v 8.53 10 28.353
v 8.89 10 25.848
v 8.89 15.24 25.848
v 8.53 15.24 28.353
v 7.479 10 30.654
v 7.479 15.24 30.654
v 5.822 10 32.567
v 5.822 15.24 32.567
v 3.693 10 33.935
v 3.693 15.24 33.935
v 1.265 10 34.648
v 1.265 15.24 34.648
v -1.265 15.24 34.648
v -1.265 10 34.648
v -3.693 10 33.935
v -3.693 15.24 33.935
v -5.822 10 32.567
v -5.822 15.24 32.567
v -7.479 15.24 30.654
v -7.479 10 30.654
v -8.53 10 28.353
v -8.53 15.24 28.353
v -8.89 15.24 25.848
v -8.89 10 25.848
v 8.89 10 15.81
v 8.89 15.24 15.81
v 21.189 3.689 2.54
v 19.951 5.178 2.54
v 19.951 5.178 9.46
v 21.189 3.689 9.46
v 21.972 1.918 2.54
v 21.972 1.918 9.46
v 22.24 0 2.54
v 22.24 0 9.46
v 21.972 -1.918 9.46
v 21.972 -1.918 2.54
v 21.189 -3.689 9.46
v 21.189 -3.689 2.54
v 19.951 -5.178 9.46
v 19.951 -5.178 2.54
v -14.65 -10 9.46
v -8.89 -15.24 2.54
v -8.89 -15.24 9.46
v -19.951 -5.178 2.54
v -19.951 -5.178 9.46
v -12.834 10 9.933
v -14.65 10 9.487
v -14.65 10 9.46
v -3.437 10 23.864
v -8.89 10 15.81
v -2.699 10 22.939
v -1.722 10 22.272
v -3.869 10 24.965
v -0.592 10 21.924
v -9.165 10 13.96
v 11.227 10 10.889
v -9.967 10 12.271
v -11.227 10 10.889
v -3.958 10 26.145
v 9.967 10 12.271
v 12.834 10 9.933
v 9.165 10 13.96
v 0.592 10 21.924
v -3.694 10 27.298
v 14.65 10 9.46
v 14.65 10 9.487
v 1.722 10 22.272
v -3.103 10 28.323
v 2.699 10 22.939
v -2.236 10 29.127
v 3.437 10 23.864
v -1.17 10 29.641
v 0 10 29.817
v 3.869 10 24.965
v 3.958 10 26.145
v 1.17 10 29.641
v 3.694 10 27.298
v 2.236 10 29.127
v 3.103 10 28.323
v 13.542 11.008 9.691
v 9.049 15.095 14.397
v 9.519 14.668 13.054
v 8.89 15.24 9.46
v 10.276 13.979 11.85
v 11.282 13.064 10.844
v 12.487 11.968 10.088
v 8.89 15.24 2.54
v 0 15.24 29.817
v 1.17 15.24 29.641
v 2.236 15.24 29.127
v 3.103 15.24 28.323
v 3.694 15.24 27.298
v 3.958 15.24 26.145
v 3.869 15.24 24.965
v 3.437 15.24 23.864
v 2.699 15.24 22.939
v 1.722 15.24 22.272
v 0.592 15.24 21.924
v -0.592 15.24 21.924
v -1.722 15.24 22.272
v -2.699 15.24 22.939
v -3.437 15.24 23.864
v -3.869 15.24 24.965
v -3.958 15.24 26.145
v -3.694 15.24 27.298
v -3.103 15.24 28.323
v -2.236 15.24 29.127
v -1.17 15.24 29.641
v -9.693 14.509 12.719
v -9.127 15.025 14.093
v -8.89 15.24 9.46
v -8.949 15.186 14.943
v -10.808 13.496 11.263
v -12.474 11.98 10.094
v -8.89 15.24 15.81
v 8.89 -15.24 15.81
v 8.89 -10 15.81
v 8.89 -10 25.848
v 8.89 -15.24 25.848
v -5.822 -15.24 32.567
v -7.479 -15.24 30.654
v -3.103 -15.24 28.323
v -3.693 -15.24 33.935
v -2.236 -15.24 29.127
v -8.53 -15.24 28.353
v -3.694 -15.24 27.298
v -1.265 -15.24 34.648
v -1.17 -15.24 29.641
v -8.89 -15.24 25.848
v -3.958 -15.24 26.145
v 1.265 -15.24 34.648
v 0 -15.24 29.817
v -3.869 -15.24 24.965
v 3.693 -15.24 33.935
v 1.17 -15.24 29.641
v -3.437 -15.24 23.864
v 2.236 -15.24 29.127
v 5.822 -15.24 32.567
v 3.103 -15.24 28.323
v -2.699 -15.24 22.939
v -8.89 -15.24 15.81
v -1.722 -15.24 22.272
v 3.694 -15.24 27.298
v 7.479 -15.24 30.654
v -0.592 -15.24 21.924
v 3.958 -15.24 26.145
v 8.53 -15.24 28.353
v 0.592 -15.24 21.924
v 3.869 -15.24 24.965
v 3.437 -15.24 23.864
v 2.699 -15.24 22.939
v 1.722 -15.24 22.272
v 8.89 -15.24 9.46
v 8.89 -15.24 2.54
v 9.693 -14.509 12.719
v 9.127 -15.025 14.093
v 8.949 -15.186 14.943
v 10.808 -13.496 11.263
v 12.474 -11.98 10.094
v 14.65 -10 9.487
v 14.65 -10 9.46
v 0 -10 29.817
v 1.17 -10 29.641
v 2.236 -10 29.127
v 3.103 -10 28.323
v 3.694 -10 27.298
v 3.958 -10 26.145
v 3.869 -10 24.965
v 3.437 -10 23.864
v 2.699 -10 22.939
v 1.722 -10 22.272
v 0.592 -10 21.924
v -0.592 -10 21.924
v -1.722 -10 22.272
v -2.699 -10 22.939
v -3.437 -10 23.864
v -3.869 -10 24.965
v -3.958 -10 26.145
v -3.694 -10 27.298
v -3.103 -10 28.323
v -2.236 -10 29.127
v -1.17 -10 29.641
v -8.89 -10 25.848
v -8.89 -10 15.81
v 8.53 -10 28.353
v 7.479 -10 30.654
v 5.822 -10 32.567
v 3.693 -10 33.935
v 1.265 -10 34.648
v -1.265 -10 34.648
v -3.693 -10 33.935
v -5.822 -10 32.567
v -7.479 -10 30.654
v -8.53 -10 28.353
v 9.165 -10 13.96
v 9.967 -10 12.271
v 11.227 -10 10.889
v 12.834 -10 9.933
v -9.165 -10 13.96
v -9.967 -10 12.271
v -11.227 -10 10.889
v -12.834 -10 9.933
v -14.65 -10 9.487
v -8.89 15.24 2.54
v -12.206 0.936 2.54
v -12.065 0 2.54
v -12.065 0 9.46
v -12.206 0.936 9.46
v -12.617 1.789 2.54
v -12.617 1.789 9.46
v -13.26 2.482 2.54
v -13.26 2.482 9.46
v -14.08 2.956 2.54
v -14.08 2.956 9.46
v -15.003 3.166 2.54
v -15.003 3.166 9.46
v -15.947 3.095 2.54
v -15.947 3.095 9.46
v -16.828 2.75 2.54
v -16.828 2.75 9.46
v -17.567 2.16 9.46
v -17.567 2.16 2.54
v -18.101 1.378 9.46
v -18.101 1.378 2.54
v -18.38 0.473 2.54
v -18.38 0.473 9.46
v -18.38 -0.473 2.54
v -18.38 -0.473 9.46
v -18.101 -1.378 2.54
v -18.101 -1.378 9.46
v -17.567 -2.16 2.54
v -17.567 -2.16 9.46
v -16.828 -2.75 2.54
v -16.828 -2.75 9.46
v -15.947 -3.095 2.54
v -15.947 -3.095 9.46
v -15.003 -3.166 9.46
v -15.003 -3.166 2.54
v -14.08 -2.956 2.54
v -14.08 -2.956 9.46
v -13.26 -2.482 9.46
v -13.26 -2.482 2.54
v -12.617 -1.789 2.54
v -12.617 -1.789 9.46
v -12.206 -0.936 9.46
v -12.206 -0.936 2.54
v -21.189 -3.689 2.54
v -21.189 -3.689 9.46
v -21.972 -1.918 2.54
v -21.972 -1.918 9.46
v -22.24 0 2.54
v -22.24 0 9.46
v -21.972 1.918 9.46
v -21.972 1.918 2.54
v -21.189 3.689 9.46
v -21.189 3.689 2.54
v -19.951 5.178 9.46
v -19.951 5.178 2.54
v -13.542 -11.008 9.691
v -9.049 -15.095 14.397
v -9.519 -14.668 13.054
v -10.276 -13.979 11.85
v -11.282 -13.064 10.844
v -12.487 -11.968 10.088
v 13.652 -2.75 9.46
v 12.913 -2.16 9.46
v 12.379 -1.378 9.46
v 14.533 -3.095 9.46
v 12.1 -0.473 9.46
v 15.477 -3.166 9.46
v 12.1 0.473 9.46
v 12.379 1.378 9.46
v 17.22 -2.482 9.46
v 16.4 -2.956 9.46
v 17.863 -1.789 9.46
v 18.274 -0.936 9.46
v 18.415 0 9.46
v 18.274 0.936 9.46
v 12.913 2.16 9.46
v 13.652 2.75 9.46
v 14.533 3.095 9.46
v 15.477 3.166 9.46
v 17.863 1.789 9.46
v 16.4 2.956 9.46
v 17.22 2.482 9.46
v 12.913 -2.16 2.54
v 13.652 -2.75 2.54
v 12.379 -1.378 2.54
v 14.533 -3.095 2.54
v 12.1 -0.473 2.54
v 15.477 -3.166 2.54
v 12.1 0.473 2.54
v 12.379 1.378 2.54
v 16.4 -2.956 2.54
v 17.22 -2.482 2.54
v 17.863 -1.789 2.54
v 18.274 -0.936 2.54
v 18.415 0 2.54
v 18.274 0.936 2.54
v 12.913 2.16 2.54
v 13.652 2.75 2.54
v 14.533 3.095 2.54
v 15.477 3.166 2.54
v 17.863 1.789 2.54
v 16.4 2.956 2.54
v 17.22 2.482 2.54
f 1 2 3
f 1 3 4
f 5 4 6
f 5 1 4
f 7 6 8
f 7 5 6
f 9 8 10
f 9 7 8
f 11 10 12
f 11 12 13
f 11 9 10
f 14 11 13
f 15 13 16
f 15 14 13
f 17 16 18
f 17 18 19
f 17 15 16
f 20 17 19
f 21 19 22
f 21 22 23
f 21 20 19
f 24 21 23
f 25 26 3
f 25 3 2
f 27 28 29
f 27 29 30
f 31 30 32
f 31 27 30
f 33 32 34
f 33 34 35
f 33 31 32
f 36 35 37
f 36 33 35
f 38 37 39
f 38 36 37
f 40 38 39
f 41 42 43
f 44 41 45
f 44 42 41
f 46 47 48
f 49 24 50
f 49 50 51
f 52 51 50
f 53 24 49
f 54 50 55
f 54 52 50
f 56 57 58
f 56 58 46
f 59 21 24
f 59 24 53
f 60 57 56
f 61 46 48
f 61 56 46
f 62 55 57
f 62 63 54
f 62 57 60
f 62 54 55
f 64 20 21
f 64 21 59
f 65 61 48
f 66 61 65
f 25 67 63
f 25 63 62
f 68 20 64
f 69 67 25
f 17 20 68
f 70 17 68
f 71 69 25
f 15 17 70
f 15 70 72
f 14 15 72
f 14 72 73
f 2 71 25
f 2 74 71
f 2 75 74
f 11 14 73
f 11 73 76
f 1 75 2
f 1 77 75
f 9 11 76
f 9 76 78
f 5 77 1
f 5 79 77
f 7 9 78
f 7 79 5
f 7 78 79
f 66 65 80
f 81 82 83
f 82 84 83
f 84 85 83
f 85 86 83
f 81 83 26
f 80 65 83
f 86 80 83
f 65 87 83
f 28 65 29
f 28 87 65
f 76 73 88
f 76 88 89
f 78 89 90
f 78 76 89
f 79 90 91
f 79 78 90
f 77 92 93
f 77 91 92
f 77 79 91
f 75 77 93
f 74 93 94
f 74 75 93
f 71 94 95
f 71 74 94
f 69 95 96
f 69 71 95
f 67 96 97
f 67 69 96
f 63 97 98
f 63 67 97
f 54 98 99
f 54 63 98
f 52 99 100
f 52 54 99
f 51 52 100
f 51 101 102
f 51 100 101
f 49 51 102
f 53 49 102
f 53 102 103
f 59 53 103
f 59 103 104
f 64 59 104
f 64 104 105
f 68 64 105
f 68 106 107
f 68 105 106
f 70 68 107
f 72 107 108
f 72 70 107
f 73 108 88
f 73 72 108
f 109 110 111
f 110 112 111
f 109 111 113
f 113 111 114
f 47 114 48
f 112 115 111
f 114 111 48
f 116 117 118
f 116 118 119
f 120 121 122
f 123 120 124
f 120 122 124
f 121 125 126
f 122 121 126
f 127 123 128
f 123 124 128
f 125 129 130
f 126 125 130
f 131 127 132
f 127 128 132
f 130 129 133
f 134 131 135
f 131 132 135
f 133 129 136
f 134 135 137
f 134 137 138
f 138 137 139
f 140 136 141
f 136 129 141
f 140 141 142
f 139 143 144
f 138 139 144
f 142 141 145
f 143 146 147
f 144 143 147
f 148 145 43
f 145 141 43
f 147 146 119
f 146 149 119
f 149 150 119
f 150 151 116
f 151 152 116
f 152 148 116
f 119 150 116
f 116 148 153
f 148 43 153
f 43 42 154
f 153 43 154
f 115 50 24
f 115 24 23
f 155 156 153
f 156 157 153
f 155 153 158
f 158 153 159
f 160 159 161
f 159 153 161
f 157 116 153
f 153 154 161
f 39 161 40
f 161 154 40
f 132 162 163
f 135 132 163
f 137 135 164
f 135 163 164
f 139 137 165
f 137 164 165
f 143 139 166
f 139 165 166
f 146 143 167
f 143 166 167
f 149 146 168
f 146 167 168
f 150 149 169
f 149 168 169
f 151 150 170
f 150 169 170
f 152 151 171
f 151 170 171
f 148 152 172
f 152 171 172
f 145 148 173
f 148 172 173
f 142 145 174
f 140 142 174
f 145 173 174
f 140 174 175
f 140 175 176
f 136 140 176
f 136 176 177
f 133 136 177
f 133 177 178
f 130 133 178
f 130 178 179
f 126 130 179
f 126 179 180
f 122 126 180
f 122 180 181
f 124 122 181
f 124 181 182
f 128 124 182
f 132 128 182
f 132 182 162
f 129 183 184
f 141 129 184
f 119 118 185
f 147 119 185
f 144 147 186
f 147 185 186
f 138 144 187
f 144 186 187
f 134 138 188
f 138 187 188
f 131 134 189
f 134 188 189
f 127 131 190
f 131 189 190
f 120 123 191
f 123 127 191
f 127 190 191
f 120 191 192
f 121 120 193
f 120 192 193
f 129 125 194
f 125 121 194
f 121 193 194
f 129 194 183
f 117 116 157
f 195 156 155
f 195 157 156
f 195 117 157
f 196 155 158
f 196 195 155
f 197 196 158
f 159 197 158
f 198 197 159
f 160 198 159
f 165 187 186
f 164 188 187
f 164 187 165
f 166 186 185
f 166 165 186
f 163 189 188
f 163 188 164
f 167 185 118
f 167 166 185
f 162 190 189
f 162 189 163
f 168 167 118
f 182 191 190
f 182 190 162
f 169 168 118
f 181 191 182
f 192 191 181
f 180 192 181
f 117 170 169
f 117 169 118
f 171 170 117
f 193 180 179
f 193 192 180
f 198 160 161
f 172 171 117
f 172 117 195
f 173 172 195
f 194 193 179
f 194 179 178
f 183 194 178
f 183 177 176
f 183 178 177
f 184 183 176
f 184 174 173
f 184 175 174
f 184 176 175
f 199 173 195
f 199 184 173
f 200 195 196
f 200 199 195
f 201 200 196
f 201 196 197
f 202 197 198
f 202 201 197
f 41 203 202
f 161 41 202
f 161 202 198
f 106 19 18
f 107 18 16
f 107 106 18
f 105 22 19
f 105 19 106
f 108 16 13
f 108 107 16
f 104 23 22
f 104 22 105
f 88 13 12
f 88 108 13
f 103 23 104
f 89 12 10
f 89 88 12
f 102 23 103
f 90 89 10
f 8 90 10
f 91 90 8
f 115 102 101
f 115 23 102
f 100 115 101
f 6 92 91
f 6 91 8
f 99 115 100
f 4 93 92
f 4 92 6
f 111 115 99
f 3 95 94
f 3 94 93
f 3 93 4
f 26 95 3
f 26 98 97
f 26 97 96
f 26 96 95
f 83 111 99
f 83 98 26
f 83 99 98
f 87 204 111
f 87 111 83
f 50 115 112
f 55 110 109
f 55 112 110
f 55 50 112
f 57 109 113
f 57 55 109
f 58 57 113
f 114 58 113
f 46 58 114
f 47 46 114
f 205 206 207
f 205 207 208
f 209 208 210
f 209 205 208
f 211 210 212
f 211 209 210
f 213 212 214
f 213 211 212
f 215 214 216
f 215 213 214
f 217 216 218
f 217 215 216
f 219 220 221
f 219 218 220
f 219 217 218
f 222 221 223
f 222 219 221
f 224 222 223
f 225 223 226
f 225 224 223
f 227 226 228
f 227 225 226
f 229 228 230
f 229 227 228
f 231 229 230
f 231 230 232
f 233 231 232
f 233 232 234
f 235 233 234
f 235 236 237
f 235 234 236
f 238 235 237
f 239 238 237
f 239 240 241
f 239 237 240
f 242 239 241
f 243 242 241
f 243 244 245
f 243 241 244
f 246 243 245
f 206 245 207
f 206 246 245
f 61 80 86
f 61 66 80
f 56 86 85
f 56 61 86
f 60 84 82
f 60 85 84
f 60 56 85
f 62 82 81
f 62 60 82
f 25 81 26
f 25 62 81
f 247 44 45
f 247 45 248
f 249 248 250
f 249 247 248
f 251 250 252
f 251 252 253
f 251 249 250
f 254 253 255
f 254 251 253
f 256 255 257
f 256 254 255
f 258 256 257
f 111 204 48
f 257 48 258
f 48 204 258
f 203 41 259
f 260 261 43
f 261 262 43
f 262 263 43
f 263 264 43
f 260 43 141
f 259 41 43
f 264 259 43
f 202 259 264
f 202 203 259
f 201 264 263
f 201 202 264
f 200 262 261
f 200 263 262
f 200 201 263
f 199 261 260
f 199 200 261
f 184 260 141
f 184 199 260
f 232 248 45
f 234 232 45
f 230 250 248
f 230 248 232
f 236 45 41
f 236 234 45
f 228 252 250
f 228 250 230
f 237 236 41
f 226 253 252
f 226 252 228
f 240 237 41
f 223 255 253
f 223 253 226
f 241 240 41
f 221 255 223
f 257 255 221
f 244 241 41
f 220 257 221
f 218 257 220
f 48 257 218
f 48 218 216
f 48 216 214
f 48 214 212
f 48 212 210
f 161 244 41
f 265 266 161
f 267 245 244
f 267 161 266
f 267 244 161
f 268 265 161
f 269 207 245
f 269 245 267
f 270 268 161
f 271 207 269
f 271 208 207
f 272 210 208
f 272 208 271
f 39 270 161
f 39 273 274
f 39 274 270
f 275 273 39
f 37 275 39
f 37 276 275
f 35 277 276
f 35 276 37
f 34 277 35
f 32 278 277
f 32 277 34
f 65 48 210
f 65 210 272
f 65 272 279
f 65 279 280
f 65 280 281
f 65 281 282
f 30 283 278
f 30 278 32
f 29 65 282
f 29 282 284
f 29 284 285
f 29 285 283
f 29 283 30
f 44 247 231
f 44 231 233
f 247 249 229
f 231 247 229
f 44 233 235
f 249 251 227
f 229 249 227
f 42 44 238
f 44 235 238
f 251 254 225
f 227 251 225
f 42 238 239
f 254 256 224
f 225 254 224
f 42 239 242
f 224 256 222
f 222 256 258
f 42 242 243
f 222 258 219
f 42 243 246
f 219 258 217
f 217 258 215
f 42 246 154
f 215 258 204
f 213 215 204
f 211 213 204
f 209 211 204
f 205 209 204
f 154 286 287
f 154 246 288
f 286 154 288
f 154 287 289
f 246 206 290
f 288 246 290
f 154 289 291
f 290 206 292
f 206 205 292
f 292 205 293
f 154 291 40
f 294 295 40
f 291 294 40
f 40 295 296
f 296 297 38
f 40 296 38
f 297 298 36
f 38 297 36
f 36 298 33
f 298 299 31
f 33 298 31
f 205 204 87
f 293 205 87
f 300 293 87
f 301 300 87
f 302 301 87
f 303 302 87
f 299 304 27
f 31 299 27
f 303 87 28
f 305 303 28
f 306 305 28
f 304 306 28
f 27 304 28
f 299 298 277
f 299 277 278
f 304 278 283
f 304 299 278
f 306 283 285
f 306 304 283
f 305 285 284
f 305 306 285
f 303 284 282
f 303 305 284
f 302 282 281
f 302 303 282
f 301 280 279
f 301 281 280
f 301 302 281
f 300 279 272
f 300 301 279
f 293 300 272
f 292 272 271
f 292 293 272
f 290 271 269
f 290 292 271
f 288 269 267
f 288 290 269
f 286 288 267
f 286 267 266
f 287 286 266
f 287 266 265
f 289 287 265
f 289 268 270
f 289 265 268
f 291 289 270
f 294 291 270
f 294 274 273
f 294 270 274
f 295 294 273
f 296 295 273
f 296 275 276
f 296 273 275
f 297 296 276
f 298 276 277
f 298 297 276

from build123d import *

# Parameters (mm, degrees)
SKETCH1_W                      = 46.48
SKETCH1_H                      = 30.48
SKETCH1_R                      = 3.175
BOSS_EXTRUDE1_DEPTH            = 9.46
SKETCH2_W                      = 46.48
SKETCH2_H                      = 5.24
BOSS_EXTRUDE2_DEPTH            = 53
CUT_EXTRUDE1_REACH             = 70.364
SKETCH4_R                      = 3.96875
CUT_EXTRUDE1_DIRECTION_2_REACH = 70.364
CUT_EXTRUDE3_REACH             = 70.364
CUT_EXTRUDE3_DIRECTION_2_REACH = 70.364
CUT_EXTRUDE4_DEPTH             = 9.46
BOSS_EXTRUDE3_DEPTH            = 9.46
FILLET3_R                      = 6.35
CUT_EXTRUDE5_DEPTH             = 2.54


with BuildPart() as part:
    # Sketch1 → Boss-Extrude1 (new body)
    with BuildSketch(Plane.XY):
        Rectangle(SKETCH1_W, SKETCH1_H)
        with Locations((15.24, 0)):
            Circle(SKETCH1_R, mode=Mode.SUBTRACT)
        with Locations((-15.24, 0)):
            Circle(SKETCH1_R, mode=Mode.SUBTRACT)
    extrude(amount=BOSS_EXTRUDE1_DEPTH)

    # Sketch2 → Boss-Extrude2 (add)
    with BuildSketch(Plane.XY.offset(9.46)):
        with Locations((0, 12.62)):
            Rectangle(SKETCH2_W, SKETCH2_H)
        with Locations((0, -12.62)):
            Rectangle(SKETCH2_W, SKETCH2_H)
    extrude(amount=BOSS_EXTRUDE2_DEPTH)

    # Cut-Extrude1: up to this face of the body (flat: up to its plane)
    cut_extrude1_end = Plane(part.part.faces().sort_by_distance((0, -15.24, 31.23))[0])
    # Sketch4 → Cut-Extrude1 (cut, up to the picked face)
    with BuildSketch(Plane(origin=(0, 0, 0), x_dir=(1, 0, 0), z_dir=(0, 1, 0)), mode=Mode.PRIVATE) as cut_extrude1_sk1:
        with Locations(Location((0, -25.8481308, 0), (0, 0, 270))):
            Circle(SKETCH4_R)
    cut_extrude1_tool1 = split(extrude(cut_extrude1_sk1.sketch, amount=-CUT_EXTRUDE1_REACH, mode=Mode.PRIVATE), bisect_by=cut_extrude1_end, keep=Keep.BOTH, mode=Mode.PRIVATE)
    add(cut_extrude1_tool1.solids().sort_by(Axis((0, 0, 25.848131), (0, -1, 0)))[0], mode=Mode.SUBTRACT)

    # Cut-Extrude1 direction 2: up to this face of the body (flat: up to its plane)
    cut_extrude1_direction_2_end = Plane(part.part.faces().sort_by_distance((0, 15.24, 31.23))[0])
    # Sketch4 → Cut-Extrude1 direction 2 (cut, up to the picked face)
    with BuildSketch(Plane(origin=(0, 0, 0), x_dir=(1, 0, 0), z_dir=(0, 1, 0)), mode=Mode.PRIVATE) as cut_extrude1_direction_2_sk1:
        with Locations(Location((0, -25.8481308, 0), (0, 0, 270))):
            Circle(SKETCH4_R)
    cut_extrude1_direction_2_tool1 = split(extrude(cut_extrude1_direction_2_sk1.sketch, amount=CUT_EXTRUDE1_DIRECTION_2_REACH, mode=Mode.PRIVATE), bisect_by=cut_extrude1_direction_2_end, keep=Keep.BOTH, mode=Mode.PRIVATE)
    add(cut_extrude1_direction_2_tool1.solids().sort_by(Axis((0, 0, 25.848131), (0, 1, 0)))[0], mode=Mode.SUBTRACT)

    # Cut-Extrude3: up to this face of the body (flat: up to its plane)
    cut_extrude3_end = Plane(part.part.faces().sort_by_distance((0, -15.24, 31.323322986))[0])
    # Sketch6 → Cut-Extrude3 (cut, up to the picked face)
    with BuildSketch(Plane(origin=(0, 0, 0), x_dir=(1, 0, 0), z_dir=(0, 1, 0)), mode=Mode.PRIVATE) as cut_extrude3_sk1:
        with BuildLine():
            Line((-8.89, -25.8481308), (-8.89, -17.46))
            Line((-8.89, -17.46), (-8.89, -9.46))
            Line((-8.89, -9.46), (-16.89, -9.46))
            Line((-16.89, -9.46), (-23.24, -9.46))
            Line((-23.24, -9.46), (-23.24, -62.46))
            Line((-23.24, -62.46), (23.24, -62.46))
            Line((23.24, -62.46), (23.24, -9.46))
            Line((23.24, -9.46), (16.89, -9.46))
            Line((16.89, -9.46), (8.89, -9.46))
            Line((8.89, -9.46), (8.89, -17.46))
            Line((8.89, -17.46), (8.89, -25.8481308))
            ThreePointArc((8.89, -25.8481308), (0, -34.7381308), (-8.89, -25.8481308))
        make_face()
    cut_extrude3_tool1 = split(extrude(cut_extrude3_sk1.sketch, amount=-CUT_EXTRUDE3_REACH, mode=Mode.PRIVATE), bisect_by=cut_extrude3_end, keep=Keep.BOTH, mode=Mode.PRIVATE)
    add(cut_extrude3_tool1.solids().sort_by(Axis((0, 0, 38.948856), (0, -1, 0)))[0], mode=Mode.SUBTRACT)

    # Cut-Extrude3 direction 2: up to this face of the body (flat: up to its plane)
    cut_extrude3_direction_2_end = Plane(part.part.faces().sort_by_distance((0, 15.24, 31.323322986))[0])
    # Sketch6 → Cut-Extrude3 direction 2 (cut, up to the picked face)
    with BuildSketch(Plane(origin=(0, 0, 0), x_dir=(1, 0, 0), z_dir=(0, 1, 0)), mode=Mode.PRIVATE) as cut_extrude3_direction_2_sk1:
        with BuildLine():
            Line((-8.89, -25.8481308), (-8.89, -17.46))
            Line((-8.89, -17.46), (-8.89, -9.46))
            Line((-8.89, -9.46), (-16.89, -9.46))
            Line((-16.89, -9.46), (-23.24, -9.46))
            Line((-23.24, -9.46), (-23.24, -62.46))
            Line((-23.24, -62.46), (23.24, -62.46))
            Line((23.24, -62.46), (23.24, -9.46))
            Line((23.24, -9.46), (16.89, -9.46))
            Line((16.89, -9.46), (8.89, -9.46))
            Line((8.89, -9.46), (8.89, -17.46))
            Line((8.89, -17.46), (8.89, -25.8481308))
            ThreePointArc((8.89, -25.8481308), (0, -34.7381308), (-8.89, -25.8481308))
        make_face()
    cut_extrude3_direction_2_tool1 = split(extrude(cut_extrude3_direction_2_sk1.sketch, amount=CUT_EXTRUDE3_DIRECTION_2_REACH, mode=Mode.PRIVATE), bisect_by=cut_extrude3_direction_2_end, keep=Keep.BOTH, mode=Mode.PRIVATE)
    add(cut_extrude3_direction_2_tool1.solids().sort_by(Axis((0, 0, 38.948856), (0, 1, 0)))[0], mode=Mode.SUBTRACT)

    # Sketch7 → Cut-Extrude4 (cut)
    with BuildSketch(Plane.XY):
        with BuildLine():
            ThreePointArc((-15.24, -7), (-22.24, 0), (-15.24, 7))
            Line((-15.24, 7), (-8.89, 7))
            Line((-8.89, 7), (-8.89, 15.24))
            Line((-8.89, 15.24), (-23.24, 15.24))
            Line((-23.24, 15.24), (-23.24, -15.24))
            Line((-23.24, -15.24), (-8.89, -15.24))
            Line((-8.89, -15.24), (-8.89, -7))
            Line((-8.89, -7), (-15.24, -7))
        make_face()
        with BuildLine():
            Line((8.89, 15.24), (8.89, 7))
            Line((8.89, 7), (15.24, 7))
            ThreePointArc((15.24, 7), (22.24, 0), (15.24, -7))
            Line((15.24, -7), (8.89, -7))
            Line((8.89, -7), (8.89, -15.24))
            Line((8.89, -15.24), (23.24, -15.24))
            Line((23.24, -15.24), (23.24, 15.24))
            Line((23.24, 15.24), (8.89, 15.24))
        make_face()
    extrude(amount=CUT_EXTRUDE4_DEPTH, mode=Mode.SUBTRACT)

    # Sketch8 → Boss-Extrude3 (add)
    with BuildSketch(Plane.XY):
        with BuildLine():
            Line((8.89, -15.24), (19.950515714, -5.177937978))
            ThreePointArc((19.950515714, -5.177937978), (17.765315243, -6.528612634), (15.24, -7))
            Line((15.24, -7), (8.89, -7))
            Line((8.89, -7), (8.89, -15.24))
        make_face()
        with BuildLine():
            ThreePointArc((-19.950515714, -5.177937978), (-17.765315243, -6.528612634), (-15.24, -7))
            Line((-15.24, -7), (-8.89, -7))
            Line((-8.89, -7), (-8.89, -15.24))
            Line((-8.89, -15.24), (-19.950515714, -5.177937978))
        make_face()
        with BuildLine():
            Line((8.89, 15.24), (19.950515714, 5.177937978))
            ThreePointArc((19.950515714, 5.177937978), (17.765315243, 6.528612634), (15.24, 7))
            Line((15.24, 7), (8.89, 7))
            Line((8.89, 7), (8.89, 15.24))
        make_face()
        with BuildLine():
            Line((-8.89, 15.24), (-19.950515714, 5.177937978))
            ThreePointArc((-19.950515714, 5.177937978), (-17.765315243, 6.528612634), (-15.24, 7))
            Line((-15.24, 7), (-8.89, 7))
            Line((-8.89, 7), (-8.89, 15.24))
        make_face()
    extrude(amount=BOSS_EXTRUDE3_DEPTH)

    # Fillet3
    # the kernel refuses this fillet: 6.35 mm, written as the material it adds along each edge
    with BuildSketch(Plane(origin=(8.89, -10, 9.46), x_dir=(0, 0, 1), z_dir=(0, -1, 0))) as fillet3_piece_1_section:
        with BuildLine():
            CenterArc((FILLET3_R, -FILLET3_R), FILLET3_R, 90, 90)
            Line((0, -FILLET3_R), (0, 0))
            Line((0, 0), (FILLET3_R, 0))
        make_face()
    fillet3_piece_1 = extrude(amount=5.24, mode=Mode.PRIVATE)
    fillet3_piece_1 = split(fillet3_piece_1, bisect_by=Plane(origin=(10.975439596, -13.342816984, 11.151175663), z_dir=(-0.6729308163346117, 0.7397054254412585, 0)), keep=Keep.TOP, mode=Mode.PRIVATE)
    add(fillet3_piece_1)
    with BuildSketch(Plane(origin=(-8.89, -10, 9.46), x_dir=(0, 0, 1), z_dir=(0, -1, 0))) as fillet3_piece_2_section:
        with BuildLine():
            CenterArc((FILLET3_R, FILLET3_R), FILLET3_R, 180, 90)
            Line((0, FILLET3_R), (0, 0))
            Line((0, 0), (FILLET3_R, 0))
        make_face()
    fillet3_piece_2 = extrude(amount=5.24, mode=Mode.PRIVATE)
    fillet3_piece_2 = split(fillet3_piece_2, bisect_by=Plane(origin=(-10.975439596, -13.342816984, 11.151175663), z_dir=(0.6729308163346114, 0.7397054254412588, 0)), keep=Keep.TOP, mode=Mode.PRIVATE)
    add(fillet3_piece_2)
    with BuildSketch(Plane(origin=(8.89, 10, 9.46), x_dir=(1, 0, 0), z_dir=(0, 1, 0))) as fillet3_piece_3_section:
        with BuildLine():
            CenterArc((FILLET3_R, -FILLET3_R), FILLET3_R, 90, 90)
            Line((0, -FILLET3_R), (0, 0))
            Line((0, 0), (FILLET3_R, 0))
        make_face()
    fillet3_piece_3 = extrude(amount=5.24, mode=Mode.PRIVATE)
    fillet3_piece_3 = split(fillet3_piece_3, bisect_by=Plane(origin=(10.975439596, 13.342816985, 11.151175663), z_dir=(-0.6729308163346115, -0.7397054254412587, 0)), keep=Keep.TOP, mode=Mode.PRIVATE)
    add(fillet3_piece_3)
    with BuildSketch(Plane(origin=(-8.89, 10, 9.46), x_dir=(-1, 0, 0), z_dir=(0, 1, 0))) as fillet3_piece_4_section:
        with BuildLine():
            CenterArc((FILLET3_R, FILLET3_R), FILLET3_R, 180, 90)
            Line((0, FILLET3_R), (0, 0))
            Line((0, 0), (FILLET3_R, 0))
        make_face()
    fillet3_piece_4 = extrude(amount=5.24, mode=Mode.PRIVATE)
    fillet3_piece_4 = split(fillet3_piece_4, bisect_by=Plane(origin=(-10.975439596, 13.342816985, 11.151175663), z_dir=(0.6729308163346117, -0.7397054254412585, 0)), keep=Keep.TOP, mode=Mode.PRIVATE)
    add(fillet3_piece_4)

    # Sketch10 → Cut-Extrude5 (cut)
    with BuildSketch(Plane.XY):
        with BuildLine():
            Line((-8.89, 15.24), (-19.950515714, 5.177937978))
            ThreePointArc((-19.950515714, 5.177937978), (-22.24, 0), (-19.950515714, -5.177937978))
            Line((-19.950515714, -5.177937978), (-8.89, -15.24))
            Line((-8.89, -15.24), (8.89, -15.24))
            Line((8.89, -15.24), (19.950515714, -5.177937978))
            ThreePointArc((19.950515714, -5.177937978), (22.24, 0), (19.950515714, 5.177937978))
            Line((19.950515714, 5.177937978), (8.89, 15.24))
            Line((8.89, 15.24), (-8.89, 15.24))
        make_face()
    extrude(amount=CUT_EXTRUDE5_DEPTH, mode=Mode.SUBTRACT)


solid = part.part
